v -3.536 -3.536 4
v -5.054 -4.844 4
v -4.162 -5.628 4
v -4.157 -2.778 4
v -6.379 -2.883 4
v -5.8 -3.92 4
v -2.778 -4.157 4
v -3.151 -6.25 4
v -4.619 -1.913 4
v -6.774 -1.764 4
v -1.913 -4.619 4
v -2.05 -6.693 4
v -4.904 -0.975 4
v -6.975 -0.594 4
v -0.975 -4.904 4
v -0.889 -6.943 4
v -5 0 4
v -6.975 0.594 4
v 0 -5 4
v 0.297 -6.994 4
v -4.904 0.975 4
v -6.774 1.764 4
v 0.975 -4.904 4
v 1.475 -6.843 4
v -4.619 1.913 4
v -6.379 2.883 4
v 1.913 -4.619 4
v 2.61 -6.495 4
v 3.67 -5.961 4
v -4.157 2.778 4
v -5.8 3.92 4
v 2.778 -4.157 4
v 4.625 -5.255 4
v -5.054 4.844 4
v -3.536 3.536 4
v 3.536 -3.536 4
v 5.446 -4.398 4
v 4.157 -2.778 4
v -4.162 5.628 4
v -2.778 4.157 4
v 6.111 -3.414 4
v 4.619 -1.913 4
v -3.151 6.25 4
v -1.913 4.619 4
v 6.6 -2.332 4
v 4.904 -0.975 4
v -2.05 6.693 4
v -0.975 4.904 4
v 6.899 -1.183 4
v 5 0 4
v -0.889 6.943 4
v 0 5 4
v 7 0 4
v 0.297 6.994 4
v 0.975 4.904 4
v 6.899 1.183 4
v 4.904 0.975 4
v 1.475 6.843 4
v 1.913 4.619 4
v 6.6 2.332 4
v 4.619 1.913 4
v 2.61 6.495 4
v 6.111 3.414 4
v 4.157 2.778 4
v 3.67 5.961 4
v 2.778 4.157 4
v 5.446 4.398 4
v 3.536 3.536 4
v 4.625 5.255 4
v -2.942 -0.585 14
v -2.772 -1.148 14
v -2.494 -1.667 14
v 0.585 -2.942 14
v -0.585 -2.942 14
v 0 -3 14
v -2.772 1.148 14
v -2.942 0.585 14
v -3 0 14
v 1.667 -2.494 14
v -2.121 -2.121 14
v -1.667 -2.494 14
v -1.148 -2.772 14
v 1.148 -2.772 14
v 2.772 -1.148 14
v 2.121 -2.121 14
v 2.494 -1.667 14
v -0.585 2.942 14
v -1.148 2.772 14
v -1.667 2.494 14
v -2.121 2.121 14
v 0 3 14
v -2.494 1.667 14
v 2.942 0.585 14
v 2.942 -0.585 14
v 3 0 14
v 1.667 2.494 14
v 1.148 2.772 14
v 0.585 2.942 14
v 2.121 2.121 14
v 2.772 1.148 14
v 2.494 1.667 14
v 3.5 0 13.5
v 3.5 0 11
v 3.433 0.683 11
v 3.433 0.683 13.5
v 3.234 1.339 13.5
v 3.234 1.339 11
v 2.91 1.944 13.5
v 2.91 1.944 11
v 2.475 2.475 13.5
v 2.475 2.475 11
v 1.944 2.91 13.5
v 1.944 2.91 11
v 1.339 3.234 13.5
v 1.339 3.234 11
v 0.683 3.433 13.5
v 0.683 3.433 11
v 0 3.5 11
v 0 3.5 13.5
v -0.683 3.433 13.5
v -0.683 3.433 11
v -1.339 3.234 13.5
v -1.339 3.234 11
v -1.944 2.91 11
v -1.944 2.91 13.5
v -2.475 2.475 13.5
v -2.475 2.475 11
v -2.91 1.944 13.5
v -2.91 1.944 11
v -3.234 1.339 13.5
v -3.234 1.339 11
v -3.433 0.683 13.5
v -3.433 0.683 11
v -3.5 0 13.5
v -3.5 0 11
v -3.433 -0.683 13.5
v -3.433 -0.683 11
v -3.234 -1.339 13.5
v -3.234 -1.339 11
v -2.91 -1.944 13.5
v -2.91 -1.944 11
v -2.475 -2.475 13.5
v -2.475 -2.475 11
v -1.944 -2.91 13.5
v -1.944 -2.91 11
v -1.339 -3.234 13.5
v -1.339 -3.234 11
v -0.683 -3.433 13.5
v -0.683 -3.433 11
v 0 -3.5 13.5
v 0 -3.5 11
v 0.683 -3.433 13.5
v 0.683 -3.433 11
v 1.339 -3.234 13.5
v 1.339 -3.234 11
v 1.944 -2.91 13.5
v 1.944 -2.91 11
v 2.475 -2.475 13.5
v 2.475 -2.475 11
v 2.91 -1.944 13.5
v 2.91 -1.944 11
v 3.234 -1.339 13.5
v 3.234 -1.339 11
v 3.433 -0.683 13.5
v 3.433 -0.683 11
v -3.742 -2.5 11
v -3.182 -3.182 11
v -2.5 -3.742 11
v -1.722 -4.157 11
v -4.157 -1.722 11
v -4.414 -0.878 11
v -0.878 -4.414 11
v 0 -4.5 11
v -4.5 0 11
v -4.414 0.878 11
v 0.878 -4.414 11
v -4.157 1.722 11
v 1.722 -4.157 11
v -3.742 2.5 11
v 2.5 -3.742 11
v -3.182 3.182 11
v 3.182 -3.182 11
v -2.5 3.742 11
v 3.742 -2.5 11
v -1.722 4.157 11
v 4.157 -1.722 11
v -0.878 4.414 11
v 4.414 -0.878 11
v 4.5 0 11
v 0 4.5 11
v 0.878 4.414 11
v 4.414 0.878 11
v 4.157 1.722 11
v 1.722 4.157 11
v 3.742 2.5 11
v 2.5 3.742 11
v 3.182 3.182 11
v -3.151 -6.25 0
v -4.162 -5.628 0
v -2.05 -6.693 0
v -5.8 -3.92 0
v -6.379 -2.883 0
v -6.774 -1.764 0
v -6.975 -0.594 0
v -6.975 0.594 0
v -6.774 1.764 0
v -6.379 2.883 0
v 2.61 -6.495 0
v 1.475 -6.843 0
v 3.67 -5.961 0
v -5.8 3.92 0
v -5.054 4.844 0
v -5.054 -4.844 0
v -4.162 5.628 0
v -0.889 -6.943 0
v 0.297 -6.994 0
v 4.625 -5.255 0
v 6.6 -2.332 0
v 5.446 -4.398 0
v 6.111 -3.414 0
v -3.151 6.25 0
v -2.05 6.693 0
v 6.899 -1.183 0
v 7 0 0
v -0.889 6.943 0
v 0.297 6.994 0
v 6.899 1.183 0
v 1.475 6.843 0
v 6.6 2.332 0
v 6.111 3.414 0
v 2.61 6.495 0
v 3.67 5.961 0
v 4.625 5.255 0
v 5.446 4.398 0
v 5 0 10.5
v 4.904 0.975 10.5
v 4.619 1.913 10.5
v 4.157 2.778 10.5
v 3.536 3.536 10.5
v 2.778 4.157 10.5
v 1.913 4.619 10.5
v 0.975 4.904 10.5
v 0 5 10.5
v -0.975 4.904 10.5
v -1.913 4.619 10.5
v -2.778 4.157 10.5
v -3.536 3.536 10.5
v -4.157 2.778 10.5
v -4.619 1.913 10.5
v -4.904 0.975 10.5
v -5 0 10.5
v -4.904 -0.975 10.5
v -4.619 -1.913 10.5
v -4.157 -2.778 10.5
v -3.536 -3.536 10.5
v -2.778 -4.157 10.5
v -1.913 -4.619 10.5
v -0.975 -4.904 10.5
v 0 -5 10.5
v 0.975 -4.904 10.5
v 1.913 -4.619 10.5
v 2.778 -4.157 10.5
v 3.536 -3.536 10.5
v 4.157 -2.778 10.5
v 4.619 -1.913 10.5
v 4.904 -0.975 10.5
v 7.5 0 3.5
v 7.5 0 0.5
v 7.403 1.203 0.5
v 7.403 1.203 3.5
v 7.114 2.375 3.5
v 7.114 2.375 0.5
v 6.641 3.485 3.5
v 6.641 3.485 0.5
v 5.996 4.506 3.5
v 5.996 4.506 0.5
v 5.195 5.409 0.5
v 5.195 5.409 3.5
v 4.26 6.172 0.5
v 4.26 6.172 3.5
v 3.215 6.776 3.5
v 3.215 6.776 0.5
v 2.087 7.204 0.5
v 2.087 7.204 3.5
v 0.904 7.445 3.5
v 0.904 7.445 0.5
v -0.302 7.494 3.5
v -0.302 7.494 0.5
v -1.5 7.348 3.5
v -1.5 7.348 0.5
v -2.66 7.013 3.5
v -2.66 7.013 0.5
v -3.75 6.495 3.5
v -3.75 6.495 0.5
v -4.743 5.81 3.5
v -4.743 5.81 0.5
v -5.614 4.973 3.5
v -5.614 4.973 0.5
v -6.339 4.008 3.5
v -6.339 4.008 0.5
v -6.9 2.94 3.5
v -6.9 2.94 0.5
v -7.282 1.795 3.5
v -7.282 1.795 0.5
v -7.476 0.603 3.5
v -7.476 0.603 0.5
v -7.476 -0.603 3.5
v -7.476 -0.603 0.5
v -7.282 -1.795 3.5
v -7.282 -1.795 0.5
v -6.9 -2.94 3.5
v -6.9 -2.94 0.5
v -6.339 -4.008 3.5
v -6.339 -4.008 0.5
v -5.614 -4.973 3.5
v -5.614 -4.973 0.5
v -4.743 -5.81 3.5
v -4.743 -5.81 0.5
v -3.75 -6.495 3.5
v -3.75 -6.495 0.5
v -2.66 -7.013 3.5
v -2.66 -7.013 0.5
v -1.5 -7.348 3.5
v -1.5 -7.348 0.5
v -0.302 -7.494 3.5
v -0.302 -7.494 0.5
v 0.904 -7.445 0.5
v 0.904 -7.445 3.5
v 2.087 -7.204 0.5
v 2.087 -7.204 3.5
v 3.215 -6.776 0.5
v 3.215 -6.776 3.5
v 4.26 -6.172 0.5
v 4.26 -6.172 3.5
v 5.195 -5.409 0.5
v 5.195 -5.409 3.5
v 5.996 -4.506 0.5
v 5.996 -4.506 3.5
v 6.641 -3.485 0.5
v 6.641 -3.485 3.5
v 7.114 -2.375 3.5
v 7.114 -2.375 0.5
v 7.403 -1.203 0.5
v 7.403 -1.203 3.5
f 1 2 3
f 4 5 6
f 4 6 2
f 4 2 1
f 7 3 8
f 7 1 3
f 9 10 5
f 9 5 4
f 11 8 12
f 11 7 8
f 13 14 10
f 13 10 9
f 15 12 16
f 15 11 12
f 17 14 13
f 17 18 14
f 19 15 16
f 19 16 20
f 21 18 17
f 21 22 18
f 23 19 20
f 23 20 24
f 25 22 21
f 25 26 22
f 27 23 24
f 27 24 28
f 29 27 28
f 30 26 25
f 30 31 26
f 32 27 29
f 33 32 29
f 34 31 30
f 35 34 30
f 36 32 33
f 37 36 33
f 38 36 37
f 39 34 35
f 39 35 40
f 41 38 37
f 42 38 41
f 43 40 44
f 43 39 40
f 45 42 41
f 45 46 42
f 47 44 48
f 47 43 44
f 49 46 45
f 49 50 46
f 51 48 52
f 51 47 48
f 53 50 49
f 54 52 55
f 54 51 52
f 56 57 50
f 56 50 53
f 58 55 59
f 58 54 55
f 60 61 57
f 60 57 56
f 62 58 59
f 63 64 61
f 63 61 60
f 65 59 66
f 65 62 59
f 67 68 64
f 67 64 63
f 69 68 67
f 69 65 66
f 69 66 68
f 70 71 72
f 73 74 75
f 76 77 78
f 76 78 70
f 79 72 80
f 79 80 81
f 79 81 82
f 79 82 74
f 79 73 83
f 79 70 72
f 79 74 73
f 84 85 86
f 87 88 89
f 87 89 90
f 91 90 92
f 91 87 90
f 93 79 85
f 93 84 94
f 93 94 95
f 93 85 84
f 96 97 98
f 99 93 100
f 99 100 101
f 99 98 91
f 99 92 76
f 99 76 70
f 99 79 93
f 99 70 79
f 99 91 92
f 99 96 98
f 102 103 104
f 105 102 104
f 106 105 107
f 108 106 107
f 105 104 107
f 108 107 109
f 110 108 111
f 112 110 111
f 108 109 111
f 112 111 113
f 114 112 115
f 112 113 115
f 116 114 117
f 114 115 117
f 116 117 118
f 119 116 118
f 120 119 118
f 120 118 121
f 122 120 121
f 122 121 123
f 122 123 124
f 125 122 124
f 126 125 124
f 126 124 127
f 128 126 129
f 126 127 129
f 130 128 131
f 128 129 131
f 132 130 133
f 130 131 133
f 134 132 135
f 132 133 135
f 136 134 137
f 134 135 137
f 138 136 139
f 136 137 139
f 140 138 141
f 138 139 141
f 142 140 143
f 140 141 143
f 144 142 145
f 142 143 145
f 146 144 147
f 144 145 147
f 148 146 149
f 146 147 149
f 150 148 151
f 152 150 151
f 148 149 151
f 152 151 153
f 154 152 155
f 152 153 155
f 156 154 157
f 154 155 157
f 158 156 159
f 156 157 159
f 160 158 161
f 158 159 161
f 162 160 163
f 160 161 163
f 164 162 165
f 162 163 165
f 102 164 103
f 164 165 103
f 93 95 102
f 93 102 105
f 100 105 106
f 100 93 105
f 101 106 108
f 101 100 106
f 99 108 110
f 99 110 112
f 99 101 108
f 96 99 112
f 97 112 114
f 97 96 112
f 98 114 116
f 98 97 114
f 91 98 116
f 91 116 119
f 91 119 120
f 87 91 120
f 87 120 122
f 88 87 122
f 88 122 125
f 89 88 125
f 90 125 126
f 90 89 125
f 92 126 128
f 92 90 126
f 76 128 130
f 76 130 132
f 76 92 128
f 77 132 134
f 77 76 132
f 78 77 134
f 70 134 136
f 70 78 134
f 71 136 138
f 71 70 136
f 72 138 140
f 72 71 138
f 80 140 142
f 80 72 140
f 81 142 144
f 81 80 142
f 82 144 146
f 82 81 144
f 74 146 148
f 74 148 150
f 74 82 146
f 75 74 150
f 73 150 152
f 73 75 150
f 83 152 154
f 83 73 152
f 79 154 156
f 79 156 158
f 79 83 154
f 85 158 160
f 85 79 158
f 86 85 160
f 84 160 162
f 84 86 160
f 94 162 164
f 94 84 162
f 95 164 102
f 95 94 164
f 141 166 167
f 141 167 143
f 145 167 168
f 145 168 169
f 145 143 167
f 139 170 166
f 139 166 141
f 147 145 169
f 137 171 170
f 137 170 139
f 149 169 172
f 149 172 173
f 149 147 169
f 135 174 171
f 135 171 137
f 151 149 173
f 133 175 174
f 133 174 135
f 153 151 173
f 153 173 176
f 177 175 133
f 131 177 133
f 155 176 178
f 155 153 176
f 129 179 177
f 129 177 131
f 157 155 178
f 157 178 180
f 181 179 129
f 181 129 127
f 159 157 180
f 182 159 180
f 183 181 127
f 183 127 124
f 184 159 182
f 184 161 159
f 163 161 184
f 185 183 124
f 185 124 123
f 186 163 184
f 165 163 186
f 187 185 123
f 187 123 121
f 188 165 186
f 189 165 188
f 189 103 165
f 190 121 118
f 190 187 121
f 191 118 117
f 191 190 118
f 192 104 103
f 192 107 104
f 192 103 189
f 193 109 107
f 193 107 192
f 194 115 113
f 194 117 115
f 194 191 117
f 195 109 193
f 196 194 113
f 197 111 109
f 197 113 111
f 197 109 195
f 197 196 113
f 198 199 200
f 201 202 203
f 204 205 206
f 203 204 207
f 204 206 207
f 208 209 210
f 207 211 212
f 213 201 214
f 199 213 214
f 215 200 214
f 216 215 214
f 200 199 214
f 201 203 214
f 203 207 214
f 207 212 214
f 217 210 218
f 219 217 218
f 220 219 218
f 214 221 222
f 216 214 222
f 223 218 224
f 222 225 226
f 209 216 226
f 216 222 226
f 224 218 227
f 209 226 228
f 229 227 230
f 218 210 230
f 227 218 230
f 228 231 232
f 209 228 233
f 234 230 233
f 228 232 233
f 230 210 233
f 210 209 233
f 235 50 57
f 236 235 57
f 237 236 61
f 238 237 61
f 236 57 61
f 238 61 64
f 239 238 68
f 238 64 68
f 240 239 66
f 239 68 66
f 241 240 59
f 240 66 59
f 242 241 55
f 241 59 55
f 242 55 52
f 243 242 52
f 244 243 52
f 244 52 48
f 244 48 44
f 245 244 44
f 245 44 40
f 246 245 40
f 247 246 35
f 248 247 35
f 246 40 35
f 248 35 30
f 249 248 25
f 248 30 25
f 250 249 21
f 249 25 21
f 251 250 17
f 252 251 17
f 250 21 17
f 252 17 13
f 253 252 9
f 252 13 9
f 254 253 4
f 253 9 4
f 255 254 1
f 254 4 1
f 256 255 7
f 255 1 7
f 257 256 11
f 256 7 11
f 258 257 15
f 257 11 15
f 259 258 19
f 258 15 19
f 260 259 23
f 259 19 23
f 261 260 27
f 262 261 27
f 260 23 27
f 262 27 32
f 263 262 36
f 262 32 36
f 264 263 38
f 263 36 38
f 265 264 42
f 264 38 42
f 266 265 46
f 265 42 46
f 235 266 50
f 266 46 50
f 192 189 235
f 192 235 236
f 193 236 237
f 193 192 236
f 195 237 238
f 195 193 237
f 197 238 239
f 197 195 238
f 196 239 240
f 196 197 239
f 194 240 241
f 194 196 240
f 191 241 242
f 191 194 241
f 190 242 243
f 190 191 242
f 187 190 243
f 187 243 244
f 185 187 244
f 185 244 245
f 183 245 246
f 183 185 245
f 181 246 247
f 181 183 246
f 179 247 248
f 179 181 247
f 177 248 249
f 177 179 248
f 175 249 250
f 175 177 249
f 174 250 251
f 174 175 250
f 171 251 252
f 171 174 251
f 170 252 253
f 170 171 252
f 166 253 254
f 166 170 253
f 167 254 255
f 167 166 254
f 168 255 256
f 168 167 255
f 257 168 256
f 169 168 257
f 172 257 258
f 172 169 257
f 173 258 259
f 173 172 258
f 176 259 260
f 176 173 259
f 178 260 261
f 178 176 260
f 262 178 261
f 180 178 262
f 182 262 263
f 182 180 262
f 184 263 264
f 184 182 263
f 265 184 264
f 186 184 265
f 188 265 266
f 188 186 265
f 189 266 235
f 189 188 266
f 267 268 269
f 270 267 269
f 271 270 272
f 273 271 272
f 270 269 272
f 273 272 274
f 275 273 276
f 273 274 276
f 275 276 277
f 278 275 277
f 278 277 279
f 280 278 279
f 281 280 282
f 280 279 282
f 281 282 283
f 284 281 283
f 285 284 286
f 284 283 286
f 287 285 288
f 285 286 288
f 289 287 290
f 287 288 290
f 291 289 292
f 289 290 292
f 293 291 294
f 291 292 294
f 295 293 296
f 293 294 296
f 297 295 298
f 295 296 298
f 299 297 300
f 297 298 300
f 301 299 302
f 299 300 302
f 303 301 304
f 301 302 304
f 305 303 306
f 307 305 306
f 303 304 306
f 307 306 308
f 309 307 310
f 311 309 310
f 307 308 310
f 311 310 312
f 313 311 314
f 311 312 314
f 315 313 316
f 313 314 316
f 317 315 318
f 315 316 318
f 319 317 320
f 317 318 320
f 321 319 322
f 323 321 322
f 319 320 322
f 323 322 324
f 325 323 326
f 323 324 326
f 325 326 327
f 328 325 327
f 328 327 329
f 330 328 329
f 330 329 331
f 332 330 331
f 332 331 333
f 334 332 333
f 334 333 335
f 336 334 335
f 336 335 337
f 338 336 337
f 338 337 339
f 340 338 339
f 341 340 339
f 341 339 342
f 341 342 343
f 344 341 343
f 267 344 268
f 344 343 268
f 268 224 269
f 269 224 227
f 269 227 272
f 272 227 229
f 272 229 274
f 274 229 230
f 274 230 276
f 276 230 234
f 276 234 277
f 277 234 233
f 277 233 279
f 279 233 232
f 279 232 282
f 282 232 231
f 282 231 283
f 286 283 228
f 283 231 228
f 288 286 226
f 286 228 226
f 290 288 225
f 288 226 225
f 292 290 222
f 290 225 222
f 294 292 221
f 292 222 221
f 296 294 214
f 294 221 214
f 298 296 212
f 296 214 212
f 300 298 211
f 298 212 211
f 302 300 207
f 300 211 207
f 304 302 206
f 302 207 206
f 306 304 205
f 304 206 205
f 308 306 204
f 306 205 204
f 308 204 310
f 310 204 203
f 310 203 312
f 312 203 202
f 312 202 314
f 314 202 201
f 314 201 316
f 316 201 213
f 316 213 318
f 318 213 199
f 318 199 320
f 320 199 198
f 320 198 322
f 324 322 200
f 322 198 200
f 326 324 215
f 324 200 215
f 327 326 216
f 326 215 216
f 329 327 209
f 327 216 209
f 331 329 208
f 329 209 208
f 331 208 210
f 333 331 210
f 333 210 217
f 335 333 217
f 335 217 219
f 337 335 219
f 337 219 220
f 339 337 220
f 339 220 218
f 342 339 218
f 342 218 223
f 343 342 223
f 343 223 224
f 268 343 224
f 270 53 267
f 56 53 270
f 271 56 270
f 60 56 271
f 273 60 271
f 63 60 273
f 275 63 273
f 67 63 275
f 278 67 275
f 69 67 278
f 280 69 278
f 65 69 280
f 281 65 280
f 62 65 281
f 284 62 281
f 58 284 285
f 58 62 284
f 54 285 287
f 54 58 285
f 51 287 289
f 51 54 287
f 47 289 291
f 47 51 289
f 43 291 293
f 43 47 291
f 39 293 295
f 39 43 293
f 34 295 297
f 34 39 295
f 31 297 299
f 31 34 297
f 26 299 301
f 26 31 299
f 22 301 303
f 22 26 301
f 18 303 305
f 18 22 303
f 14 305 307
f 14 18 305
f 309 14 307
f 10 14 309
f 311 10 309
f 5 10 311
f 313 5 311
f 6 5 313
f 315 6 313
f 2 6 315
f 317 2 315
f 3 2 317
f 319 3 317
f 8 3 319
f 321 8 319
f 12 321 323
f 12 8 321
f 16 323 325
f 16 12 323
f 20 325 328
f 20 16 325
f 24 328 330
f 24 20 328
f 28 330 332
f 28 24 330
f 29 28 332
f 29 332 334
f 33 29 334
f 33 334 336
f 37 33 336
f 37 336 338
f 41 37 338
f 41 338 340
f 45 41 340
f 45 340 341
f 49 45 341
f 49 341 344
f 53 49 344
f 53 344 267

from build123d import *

# Parameters (mm, degrees)
F0_R     = 7.5
F1_DEPTH = 4
F2_R     = 5
F3_DEPTH = 7
F4_R     = 3.5
F5_DEPTH = 3
F6_SIZE  = 0.5


with BuildPart() as f1:
    # F0 (on Top) → F1 (new body)
    with BuildSketch(Plane.XY):
        Circle(F0_R)
    extrude(amount=F1_DEPTH)

    # F2 (on face) → F3 (join)
    with BuildSketch(Plane.XY.offset(4)):
        Circle(F2_R)
    extrude(amount=F3_DEPTH)

    # F4 (on face) → F5 (join)
    with BuildSketch(Plane.XY.offset(11)):
        Circle(F4_R)
    extrude(amount=F5_DEPTH)

    # F6
    f6_edges = [f1.edges().sort_by_distance(p)[0] for p in [
        (-3.5, 0, 14),
        (-5, 0, 11),
        (-7.5, 0, 4),
        (-7.5, 0, 0),
    ]]
    chamfer(f6_edges, length=F6_SIZE)


solid = f1.part
